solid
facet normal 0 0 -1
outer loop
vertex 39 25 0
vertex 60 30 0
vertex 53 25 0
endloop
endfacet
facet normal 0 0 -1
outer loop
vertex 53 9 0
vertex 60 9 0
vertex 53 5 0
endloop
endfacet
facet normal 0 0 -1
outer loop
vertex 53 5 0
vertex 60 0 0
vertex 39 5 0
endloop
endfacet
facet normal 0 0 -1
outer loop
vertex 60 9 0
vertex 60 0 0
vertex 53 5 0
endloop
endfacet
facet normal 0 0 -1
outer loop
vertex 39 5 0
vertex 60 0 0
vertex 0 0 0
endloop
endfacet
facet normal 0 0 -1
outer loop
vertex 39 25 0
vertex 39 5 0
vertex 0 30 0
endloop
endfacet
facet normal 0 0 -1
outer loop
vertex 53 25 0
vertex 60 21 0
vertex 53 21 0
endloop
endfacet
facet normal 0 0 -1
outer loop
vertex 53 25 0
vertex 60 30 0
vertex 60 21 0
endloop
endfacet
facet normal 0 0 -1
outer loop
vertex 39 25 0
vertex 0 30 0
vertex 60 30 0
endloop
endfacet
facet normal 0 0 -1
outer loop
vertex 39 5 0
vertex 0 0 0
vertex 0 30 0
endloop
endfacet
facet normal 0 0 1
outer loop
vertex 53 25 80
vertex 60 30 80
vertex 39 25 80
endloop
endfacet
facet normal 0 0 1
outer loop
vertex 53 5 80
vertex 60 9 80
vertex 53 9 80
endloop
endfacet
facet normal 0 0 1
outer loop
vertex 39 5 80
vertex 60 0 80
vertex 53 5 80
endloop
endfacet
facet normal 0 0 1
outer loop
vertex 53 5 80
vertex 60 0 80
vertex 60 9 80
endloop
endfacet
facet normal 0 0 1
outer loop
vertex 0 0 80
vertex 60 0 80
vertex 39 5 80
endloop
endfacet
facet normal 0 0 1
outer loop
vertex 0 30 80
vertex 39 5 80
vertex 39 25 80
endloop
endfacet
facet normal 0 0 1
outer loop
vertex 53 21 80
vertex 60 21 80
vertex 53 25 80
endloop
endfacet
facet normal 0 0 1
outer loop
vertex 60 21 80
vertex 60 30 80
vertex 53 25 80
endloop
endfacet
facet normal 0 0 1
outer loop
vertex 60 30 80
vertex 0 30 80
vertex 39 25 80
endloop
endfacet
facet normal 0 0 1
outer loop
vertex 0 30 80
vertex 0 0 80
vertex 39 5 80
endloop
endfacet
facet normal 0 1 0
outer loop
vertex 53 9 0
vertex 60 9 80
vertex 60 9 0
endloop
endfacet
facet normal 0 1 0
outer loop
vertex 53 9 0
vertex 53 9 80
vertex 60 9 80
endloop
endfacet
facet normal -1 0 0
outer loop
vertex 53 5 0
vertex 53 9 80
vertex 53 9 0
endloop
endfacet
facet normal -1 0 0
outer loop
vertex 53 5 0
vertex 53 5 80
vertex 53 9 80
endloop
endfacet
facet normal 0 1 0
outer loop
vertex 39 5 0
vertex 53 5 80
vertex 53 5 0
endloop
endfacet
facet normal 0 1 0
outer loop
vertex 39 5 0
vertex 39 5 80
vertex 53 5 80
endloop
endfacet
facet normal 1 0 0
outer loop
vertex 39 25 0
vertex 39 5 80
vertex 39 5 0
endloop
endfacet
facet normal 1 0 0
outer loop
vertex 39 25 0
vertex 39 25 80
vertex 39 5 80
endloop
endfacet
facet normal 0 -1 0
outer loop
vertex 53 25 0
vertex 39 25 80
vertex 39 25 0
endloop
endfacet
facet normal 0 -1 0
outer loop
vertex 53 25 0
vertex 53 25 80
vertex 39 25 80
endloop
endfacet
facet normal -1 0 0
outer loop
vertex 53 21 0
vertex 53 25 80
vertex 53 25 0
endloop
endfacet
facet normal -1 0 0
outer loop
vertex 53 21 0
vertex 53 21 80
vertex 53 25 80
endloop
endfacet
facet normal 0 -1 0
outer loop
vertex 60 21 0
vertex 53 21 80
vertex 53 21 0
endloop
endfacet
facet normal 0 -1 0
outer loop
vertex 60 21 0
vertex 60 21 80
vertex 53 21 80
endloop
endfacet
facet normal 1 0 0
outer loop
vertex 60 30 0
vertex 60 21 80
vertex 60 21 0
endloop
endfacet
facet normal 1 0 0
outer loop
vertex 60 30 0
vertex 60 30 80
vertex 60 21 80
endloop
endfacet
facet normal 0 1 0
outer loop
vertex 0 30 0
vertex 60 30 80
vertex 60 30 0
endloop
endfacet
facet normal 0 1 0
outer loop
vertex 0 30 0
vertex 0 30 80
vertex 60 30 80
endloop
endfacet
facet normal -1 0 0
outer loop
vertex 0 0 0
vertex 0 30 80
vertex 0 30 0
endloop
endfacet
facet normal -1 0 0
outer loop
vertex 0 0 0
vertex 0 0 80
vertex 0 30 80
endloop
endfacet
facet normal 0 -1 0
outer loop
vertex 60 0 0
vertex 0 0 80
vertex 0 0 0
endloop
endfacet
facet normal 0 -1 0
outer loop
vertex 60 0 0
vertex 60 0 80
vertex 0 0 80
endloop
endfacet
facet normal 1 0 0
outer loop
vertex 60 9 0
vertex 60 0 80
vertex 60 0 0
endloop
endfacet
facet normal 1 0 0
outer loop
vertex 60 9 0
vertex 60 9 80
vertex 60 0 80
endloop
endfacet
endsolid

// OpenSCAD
$fn = 32;

// ----------------------------------------------------------------------
// T-slot rail: 60 x 30 mm section, 80 mm long
// ----------------------------------------------------------------------

// --- parameters (mm) ---
profile_height = 80;      // extrusion height
profile_points = 12;      // points of the closed outline

profile = [[0, 0], [60, 0], [60, 9], [53, 9], [53, 5], [39, 5], [39, 25], [53, 25], [53, 21], [60, 21], [60, 30], [0, 30]];  // single closed polygon, 12 points, counter clockwise

// --- the one profile operation ---
linear_extrude(height = profile_height) polygon(points = profile);
